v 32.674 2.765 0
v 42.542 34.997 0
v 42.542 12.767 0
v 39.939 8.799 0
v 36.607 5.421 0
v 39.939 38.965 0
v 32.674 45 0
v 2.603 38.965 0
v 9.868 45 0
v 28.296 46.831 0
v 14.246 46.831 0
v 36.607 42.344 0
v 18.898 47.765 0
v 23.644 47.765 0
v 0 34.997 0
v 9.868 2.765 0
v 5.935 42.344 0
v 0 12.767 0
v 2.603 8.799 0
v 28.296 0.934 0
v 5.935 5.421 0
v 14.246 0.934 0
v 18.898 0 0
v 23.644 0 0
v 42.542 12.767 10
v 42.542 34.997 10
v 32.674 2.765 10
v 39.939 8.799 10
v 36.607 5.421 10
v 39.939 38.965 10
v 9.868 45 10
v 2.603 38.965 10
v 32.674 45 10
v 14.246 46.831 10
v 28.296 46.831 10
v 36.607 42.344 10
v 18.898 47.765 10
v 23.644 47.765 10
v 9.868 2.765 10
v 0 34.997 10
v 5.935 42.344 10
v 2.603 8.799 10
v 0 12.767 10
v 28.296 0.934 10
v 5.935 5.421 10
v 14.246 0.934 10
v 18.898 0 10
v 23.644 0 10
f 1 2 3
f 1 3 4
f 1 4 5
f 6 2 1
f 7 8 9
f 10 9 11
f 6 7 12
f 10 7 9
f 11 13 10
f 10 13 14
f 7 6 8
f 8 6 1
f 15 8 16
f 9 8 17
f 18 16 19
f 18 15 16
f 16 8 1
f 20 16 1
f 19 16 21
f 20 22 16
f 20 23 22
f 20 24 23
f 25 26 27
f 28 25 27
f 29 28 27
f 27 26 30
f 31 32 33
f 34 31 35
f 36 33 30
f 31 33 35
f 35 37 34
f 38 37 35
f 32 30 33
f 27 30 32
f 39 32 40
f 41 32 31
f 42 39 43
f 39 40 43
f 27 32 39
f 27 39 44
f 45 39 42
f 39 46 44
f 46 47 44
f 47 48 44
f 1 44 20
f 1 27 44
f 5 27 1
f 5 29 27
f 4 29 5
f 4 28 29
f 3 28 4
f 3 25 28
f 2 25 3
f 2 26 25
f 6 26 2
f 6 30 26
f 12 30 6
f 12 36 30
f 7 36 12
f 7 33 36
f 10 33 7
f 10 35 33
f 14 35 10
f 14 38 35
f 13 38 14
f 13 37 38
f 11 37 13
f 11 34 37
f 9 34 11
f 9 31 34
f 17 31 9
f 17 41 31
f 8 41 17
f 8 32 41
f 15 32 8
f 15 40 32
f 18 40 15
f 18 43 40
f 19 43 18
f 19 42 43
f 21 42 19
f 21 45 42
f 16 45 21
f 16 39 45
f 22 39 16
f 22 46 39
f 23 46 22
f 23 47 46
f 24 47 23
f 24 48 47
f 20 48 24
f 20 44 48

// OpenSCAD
$fn = 32;

// ----------------------------------------------------------------------
// Flat adaptor: double_d, 10 mm thick
// ----------------------------------------------------------------------

// --- parameters (mm) ---
profile_height = 10;      // extrusion height
profile_points = 24;      // points of the closed outline

profile = [[42.542, 34.997], [39.939, 38.965], [36.607, 42.344], [32.674, 45], [28.296, 46.831], [23.644, 47.765], [18.898, 47.765], [14.246, 46.831], [9.868, 45], [5.935, 42.344], [2.603, 38.965], [0, 34.997], [0, 12.767], [2.603, 8.799], [5.935, 5.421], [9.868, 2.765], [14.246, 0.934], [18.898, 0], [23.644, 0], [28.296, 0.934], [32.674, 2.765], [36.607, 5.421], [39.939, 8.799], [42.542, 12.767]];  // single closed polygon, 24 points, counter clockwise

// --- the one profile operation ---
linear_extrude(height = profile_height) polygon(points = profile);
